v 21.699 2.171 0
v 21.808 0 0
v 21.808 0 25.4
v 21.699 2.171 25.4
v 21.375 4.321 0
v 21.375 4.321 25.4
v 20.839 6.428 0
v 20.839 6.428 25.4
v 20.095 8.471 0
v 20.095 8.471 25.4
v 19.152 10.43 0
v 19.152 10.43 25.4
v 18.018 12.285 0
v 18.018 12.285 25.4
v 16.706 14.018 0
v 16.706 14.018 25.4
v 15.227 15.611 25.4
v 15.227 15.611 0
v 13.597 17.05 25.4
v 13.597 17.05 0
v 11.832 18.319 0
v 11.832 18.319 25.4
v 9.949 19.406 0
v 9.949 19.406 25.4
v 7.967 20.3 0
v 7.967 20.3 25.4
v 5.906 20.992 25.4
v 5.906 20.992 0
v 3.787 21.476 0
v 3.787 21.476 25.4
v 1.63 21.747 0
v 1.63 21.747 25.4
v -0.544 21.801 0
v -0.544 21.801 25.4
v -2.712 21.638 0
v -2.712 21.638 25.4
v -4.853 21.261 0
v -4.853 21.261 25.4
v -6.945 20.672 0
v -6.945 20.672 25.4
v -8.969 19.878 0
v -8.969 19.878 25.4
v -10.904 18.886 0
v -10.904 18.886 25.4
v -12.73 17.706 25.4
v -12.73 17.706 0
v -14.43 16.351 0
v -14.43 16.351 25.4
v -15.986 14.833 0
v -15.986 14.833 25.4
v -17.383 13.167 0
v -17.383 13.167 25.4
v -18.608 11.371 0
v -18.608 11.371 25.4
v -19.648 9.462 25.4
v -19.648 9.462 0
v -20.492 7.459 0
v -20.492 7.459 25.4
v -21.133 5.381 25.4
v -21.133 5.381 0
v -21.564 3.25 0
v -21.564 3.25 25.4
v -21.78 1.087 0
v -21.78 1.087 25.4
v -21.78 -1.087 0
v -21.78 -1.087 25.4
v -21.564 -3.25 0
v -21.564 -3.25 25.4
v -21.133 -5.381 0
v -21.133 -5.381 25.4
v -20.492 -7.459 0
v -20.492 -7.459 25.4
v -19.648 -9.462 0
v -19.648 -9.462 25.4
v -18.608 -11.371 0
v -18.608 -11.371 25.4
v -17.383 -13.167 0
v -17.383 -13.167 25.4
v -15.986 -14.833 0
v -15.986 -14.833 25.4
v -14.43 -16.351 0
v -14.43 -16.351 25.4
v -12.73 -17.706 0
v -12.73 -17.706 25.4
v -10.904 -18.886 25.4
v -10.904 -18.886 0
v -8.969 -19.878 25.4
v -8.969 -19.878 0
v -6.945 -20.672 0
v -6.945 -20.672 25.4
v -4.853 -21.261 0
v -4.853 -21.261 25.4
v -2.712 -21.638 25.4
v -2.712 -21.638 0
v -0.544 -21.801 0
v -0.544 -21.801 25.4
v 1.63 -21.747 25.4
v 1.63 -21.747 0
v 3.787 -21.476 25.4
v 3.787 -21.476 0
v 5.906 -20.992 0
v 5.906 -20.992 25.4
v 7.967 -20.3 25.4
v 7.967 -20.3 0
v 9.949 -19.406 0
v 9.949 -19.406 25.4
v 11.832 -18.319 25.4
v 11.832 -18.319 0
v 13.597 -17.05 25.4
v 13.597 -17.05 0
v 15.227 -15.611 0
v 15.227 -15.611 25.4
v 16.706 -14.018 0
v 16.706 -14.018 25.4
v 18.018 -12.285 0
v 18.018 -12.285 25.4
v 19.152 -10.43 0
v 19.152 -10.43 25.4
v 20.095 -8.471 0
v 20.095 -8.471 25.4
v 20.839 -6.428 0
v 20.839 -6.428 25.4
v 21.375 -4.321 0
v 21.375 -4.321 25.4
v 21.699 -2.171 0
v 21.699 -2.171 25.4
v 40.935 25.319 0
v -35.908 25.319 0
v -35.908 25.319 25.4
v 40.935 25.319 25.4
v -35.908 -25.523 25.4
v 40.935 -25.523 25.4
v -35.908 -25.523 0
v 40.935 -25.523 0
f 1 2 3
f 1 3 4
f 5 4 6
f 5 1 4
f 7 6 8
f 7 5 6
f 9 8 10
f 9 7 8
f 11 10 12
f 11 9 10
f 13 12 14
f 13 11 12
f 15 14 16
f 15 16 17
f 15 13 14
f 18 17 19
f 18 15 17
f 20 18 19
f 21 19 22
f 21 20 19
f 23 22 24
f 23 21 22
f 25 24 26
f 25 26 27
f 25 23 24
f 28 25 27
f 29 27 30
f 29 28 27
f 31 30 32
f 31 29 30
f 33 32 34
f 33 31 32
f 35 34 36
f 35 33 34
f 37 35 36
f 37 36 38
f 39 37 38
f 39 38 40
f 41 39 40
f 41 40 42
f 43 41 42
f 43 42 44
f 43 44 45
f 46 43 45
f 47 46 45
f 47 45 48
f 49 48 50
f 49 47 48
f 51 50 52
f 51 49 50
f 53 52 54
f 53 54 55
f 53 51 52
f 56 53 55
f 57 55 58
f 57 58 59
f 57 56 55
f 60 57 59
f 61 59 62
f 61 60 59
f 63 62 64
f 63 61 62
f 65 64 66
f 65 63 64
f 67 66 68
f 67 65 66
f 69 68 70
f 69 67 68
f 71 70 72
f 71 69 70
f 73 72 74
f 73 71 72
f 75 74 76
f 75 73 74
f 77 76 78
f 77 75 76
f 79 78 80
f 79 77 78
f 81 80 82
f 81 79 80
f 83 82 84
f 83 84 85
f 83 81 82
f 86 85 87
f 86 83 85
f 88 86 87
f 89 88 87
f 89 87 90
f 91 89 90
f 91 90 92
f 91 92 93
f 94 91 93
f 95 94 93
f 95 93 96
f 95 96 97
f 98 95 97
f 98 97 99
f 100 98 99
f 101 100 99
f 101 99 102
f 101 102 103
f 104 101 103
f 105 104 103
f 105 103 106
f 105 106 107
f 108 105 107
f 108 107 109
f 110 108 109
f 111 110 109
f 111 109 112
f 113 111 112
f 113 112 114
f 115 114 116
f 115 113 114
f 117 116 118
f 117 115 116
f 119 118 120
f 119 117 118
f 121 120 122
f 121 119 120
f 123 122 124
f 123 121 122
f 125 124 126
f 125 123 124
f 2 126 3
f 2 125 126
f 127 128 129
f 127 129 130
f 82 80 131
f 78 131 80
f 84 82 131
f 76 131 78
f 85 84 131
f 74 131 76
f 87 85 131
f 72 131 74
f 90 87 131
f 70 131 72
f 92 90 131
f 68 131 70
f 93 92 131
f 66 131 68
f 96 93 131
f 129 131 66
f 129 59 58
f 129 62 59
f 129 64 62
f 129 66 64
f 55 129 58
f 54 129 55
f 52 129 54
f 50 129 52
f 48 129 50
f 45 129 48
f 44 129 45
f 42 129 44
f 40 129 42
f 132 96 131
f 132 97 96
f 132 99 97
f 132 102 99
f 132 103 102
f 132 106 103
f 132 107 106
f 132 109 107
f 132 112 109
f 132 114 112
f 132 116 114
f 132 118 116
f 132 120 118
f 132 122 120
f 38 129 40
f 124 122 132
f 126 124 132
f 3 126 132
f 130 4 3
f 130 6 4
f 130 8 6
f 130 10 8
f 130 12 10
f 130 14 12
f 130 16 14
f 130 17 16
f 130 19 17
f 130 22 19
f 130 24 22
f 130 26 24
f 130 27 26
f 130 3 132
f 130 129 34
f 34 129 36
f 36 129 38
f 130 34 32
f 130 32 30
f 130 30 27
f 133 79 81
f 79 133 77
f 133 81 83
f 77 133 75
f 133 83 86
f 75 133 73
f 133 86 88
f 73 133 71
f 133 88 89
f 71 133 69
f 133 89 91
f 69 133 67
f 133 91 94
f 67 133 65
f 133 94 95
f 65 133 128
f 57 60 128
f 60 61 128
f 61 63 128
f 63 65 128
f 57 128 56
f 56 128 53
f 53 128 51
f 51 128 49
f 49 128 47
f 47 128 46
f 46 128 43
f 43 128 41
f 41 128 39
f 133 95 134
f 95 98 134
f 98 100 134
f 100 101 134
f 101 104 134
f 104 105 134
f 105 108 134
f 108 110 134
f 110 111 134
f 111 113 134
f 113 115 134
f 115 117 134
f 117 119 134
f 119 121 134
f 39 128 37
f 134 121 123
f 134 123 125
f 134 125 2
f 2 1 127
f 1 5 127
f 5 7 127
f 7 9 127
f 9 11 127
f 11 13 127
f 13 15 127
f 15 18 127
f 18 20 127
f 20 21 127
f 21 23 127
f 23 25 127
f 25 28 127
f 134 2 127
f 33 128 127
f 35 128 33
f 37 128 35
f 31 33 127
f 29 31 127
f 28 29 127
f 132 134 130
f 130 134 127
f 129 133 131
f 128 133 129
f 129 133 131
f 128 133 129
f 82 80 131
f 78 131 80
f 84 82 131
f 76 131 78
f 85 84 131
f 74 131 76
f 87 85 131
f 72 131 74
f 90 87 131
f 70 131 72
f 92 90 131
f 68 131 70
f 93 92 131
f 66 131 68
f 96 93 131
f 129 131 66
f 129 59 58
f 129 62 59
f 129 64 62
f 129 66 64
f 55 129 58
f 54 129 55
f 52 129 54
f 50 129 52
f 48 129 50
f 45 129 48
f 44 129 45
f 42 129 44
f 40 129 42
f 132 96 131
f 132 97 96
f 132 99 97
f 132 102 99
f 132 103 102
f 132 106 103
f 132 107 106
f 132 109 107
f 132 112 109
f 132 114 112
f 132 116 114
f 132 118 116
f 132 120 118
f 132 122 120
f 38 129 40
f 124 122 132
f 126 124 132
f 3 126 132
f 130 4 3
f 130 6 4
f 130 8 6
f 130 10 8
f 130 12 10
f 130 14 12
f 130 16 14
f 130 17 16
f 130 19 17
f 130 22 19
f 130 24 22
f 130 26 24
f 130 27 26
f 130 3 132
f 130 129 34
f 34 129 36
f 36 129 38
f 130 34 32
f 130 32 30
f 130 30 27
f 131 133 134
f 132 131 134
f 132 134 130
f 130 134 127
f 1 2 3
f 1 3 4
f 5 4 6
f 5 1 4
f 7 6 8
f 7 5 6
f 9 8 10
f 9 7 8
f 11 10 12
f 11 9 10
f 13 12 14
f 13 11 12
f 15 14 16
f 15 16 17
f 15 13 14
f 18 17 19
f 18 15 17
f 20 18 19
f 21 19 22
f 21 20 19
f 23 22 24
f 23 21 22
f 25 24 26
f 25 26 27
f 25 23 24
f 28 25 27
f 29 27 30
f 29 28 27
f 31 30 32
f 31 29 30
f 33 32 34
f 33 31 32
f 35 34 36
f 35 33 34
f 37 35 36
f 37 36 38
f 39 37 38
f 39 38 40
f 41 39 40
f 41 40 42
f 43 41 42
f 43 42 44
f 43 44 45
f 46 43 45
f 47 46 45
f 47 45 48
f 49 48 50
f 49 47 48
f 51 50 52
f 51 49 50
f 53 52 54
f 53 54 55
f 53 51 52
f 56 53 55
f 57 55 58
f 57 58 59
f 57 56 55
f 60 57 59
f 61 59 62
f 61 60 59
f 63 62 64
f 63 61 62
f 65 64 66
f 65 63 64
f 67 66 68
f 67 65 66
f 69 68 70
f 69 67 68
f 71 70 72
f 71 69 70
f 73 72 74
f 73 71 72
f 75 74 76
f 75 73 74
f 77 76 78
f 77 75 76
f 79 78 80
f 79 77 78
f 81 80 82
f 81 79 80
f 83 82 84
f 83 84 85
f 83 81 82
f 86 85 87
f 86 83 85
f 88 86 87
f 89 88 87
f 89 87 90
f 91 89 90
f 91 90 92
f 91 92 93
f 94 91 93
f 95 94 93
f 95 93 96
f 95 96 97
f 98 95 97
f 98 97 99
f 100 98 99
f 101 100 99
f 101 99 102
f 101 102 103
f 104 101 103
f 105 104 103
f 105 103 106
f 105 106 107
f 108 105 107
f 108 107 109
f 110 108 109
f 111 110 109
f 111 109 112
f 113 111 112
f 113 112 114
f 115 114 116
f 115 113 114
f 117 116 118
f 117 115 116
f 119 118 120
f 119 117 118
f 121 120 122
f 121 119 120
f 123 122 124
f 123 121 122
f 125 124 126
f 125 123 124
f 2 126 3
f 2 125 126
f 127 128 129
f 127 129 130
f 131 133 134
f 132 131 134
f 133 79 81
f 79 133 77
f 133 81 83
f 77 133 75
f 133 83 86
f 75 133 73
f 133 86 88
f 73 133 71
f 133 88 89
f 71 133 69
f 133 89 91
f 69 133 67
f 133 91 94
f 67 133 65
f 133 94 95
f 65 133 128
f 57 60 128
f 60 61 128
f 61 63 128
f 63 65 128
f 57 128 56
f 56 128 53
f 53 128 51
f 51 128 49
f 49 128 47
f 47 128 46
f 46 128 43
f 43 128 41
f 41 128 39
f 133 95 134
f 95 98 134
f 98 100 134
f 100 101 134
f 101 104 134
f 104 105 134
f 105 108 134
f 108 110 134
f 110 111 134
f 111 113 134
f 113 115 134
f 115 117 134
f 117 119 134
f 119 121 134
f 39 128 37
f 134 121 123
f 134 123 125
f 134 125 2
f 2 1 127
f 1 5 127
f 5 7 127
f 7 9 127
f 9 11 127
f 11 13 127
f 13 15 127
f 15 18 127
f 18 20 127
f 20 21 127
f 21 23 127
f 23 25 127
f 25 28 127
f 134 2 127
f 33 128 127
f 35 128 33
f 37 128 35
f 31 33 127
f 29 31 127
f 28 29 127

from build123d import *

# Parameters (mm, degrees)
F0_W     = 76.8432989717
F0_H     = 50.8419405669
F0_R     = 21.8075174345
F1_DEPTH = 25.4
F2_DEPTH = 25.4


# Not quite as in the source:
# - the program builds the solid bodies; features that only make, move or delete a surface that nothing else refers to are left out


with BuildPart() as f1:
    # F0 (on Top) → F1 (new body)
    with BuildSketch(Plane.XY):
        with Locations((2.5134049356, -0.1019602641)):
            Rectangle(F0_W, F0_H)
        Circle(F0_R, mode=Mode.SUBTRACT)
    extrude(amount=F1_DEPTH)


with BuildPart() as f2:
    # F0 (on Top) → F2 (new body)
    with BuildSketch(Plane.XY):
        with Locations((2.5134049356, -0.1019602641)):
            Rectangle(F0_W, F0_H)
        Circle(F0_R, mode=Mode.SUBTRACT)
    extrude(amount=F2_DEPTH)


solid = Compound([f1.part, f2.part])
